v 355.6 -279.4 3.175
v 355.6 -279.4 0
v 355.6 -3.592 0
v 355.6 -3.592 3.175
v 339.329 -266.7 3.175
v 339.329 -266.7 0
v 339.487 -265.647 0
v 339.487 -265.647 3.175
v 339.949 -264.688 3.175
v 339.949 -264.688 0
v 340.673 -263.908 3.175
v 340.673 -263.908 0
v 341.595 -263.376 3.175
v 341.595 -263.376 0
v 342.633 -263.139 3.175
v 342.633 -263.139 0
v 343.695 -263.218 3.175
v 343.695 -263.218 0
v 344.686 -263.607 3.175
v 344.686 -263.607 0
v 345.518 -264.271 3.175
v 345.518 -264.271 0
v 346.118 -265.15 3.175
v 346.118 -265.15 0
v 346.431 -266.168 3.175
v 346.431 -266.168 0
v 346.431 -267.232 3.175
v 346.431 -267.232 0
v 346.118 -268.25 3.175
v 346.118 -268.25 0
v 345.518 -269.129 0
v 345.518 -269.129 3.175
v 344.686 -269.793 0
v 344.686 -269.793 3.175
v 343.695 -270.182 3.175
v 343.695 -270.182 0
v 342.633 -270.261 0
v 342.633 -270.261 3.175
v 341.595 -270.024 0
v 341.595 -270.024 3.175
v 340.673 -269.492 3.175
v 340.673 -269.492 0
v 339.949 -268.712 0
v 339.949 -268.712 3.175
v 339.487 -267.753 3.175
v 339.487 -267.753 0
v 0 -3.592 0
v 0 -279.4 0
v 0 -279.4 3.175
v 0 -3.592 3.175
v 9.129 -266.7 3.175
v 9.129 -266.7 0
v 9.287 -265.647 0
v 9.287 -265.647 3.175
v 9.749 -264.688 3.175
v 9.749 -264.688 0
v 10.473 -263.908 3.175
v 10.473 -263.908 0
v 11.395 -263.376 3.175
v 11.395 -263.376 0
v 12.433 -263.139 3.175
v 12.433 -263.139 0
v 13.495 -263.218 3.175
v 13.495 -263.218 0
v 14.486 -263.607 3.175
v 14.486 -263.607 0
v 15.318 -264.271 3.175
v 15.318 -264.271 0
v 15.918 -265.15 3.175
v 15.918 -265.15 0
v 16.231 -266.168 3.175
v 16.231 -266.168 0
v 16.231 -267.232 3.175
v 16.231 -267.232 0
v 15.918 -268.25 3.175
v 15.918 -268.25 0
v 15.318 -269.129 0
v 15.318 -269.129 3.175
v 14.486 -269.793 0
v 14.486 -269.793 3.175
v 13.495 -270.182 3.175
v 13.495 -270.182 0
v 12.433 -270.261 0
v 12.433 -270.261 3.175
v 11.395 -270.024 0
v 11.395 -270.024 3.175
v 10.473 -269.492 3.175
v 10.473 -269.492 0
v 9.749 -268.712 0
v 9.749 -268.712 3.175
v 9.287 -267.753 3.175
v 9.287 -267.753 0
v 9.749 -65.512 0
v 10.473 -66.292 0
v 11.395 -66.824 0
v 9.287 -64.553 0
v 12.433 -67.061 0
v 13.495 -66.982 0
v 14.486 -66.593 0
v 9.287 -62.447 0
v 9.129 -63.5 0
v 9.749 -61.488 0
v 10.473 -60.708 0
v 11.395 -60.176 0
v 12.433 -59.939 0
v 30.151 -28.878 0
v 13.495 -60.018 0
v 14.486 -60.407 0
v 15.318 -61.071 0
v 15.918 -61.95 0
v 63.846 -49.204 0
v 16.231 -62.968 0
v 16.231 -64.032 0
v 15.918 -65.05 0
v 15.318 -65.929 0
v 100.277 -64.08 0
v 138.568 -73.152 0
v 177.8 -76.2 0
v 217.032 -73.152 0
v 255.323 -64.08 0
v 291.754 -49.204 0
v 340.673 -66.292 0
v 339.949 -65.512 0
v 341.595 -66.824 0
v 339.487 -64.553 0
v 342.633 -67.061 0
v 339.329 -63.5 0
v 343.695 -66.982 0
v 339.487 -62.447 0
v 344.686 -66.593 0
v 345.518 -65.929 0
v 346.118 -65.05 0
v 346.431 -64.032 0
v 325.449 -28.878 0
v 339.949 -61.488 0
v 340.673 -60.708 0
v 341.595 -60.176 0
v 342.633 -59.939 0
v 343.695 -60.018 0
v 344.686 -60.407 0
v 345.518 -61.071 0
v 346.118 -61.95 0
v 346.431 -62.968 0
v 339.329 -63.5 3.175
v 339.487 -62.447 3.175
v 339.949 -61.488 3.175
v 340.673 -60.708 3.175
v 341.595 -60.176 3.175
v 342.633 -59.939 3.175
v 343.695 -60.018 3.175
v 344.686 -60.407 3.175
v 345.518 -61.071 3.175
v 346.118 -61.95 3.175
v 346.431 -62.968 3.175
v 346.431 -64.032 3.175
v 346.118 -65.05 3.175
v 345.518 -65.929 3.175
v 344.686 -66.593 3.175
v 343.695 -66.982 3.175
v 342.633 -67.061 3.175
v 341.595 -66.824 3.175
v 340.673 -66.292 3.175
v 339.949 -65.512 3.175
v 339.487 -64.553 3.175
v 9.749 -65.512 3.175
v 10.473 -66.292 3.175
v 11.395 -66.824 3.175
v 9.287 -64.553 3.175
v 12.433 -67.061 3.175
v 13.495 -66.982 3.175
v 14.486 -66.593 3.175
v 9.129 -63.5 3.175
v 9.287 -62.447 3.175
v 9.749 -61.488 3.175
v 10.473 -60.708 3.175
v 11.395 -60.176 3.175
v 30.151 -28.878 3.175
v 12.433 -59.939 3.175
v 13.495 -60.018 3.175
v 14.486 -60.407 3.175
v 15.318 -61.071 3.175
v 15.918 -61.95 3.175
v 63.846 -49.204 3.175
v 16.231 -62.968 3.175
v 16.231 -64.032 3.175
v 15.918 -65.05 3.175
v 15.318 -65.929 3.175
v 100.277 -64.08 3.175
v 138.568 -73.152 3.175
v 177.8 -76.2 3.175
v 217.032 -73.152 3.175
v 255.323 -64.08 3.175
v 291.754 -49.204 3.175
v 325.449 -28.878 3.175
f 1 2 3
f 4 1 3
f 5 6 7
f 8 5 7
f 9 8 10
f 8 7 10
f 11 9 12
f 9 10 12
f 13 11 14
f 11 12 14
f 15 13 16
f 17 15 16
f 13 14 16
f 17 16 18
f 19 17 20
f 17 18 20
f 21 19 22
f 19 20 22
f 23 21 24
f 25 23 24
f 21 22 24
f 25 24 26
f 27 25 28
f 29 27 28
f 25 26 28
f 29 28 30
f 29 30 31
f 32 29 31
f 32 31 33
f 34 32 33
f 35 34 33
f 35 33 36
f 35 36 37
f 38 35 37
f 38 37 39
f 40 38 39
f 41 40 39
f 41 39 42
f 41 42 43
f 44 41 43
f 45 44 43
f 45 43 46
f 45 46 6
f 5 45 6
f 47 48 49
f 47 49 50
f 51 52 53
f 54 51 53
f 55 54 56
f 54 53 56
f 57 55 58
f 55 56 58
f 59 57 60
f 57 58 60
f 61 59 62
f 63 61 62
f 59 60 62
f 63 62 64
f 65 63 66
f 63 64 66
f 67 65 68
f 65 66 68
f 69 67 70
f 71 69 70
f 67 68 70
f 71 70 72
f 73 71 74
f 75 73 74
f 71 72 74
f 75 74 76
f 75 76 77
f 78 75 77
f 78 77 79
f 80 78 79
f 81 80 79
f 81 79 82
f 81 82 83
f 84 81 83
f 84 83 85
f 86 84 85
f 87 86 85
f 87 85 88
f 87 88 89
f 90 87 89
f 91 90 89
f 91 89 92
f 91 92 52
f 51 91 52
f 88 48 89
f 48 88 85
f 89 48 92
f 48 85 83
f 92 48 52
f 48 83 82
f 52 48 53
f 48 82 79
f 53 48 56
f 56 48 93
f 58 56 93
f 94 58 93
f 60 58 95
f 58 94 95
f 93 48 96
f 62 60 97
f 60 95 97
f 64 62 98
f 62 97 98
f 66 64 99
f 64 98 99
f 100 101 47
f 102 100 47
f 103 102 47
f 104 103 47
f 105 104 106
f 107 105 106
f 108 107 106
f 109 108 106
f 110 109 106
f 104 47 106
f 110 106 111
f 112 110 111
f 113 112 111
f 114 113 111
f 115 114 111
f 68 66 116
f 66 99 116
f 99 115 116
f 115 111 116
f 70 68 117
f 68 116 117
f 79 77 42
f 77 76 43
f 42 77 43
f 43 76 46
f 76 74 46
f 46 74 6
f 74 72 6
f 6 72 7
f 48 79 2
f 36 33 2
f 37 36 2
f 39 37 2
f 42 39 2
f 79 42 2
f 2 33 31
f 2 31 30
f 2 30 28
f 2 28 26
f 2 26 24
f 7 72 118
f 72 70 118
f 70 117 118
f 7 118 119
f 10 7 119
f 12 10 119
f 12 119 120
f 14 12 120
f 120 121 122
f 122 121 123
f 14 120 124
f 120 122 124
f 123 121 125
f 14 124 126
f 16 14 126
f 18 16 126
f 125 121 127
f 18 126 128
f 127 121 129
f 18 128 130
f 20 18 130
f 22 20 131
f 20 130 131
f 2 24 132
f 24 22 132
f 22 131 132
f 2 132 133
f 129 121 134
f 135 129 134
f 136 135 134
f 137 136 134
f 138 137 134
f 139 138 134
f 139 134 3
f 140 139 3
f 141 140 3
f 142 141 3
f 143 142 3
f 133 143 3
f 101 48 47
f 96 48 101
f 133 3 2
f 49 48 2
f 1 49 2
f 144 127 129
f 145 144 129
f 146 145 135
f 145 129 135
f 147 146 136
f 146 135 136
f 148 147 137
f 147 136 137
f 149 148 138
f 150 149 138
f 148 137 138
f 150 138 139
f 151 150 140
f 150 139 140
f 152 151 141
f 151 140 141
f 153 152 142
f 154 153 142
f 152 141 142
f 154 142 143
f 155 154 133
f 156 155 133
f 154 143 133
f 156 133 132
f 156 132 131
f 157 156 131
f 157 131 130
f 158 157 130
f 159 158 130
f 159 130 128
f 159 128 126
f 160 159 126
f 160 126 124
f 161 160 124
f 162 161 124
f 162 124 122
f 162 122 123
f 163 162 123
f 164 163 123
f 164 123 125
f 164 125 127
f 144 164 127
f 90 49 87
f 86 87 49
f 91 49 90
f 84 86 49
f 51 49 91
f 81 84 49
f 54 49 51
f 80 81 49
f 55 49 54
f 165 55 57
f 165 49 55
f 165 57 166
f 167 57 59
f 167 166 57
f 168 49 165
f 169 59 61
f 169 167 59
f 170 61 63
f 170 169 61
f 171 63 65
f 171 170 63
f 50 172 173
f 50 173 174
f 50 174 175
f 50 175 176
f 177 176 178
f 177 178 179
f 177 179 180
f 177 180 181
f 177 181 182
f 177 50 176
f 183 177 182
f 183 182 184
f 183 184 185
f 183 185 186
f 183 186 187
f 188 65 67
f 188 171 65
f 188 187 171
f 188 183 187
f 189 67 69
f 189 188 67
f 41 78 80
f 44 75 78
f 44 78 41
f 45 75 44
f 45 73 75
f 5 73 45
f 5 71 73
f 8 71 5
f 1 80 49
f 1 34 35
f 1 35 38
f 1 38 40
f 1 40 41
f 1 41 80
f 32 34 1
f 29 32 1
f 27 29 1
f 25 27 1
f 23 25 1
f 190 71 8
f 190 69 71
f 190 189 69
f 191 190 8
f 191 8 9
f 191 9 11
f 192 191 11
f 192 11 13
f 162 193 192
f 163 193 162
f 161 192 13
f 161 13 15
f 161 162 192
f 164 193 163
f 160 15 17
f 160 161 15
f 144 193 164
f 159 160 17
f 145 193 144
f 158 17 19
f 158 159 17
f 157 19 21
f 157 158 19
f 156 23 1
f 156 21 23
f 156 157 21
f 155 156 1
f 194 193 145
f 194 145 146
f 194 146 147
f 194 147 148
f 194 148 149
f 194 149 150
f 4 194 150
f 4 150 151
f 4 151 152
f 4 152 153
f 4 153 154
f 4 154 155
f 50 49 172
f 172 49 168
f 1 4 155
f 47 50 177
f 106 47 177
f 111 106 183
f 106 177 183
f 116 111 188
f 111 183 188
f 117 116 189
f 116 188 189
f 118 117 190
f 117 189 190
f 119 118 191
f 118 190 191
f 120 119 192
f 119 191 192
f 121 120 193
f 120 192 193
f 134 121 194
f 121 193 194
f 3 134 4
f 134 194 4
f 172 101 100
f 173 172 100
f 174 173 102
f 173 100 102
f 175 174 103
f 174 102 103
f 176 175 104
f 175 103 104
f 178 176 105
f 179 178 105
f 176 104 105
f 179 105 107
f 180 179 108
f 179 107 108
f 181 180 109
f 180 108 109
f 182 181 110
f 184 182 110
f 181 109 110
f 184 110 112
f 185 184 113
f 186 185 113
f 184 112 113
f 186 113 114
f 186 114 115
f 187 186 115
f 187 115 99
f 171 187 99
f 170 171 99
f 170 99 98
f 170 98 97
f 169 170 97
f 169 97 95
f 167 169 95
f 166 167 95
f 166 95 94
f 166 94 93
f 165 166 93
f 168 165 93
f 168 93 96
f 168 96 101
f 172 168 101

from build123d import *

# Parameters (mm, degrees)
SKETCH1_W               = 355.6
SKETCH1_H               = 279.4
BOSS_EXTRUDE1_DEPTH     = 3.175
F_1_4_CLEARANCE_HOLE1_D = 7.14248
CUT_EXTRUDE1_REACH      = 454.245
SKETCH4_R               = 254


with BuildPart() as part:
    # Sketch1 → Boss-Extrude1 (new body)
    with BuildSketch(Plane.XY):
        with Locations((177.8, -139.7)):
            Rectangle(SKETCH1_W, SKETCH1_H)
    extrude(amount=BOSS_EXTRUDE1_DEPTH)

    # 1/4 Clearance Hole1 (through all)
    with Locations(Plane.XY.offset(3.175)):
        with Locations((342.9, -63.5), (342.9, -266.7), (12.7, -266.7), (12.7, -63.5)):
            Hole(F_1_4_CLEARANCE_HOLE1_D / 2)

    # Sketch4 → Cut-Extrude1 (cut, up to next)
    with BuildSketch(Plane.XY.offset(3.175), mode=Mode.PRIVATE) as cut_extrude1_sk1:
        with Locations((177.8, 177.8)):
            Circle(SKETCH4_R)
    cut_extrude1_tool1 = extrude(cut_extrude1_sk1.sketch, amount=-CUT_EXTRUDE1_REACH, mode=Mode.PRIVATE) & part.part
    add(cut_extrude1_tool1.solids().sort_by_distance((177.8, 177.8, 3.175))[0], mode=Mode.SUBTRACT)


solid = part.part
